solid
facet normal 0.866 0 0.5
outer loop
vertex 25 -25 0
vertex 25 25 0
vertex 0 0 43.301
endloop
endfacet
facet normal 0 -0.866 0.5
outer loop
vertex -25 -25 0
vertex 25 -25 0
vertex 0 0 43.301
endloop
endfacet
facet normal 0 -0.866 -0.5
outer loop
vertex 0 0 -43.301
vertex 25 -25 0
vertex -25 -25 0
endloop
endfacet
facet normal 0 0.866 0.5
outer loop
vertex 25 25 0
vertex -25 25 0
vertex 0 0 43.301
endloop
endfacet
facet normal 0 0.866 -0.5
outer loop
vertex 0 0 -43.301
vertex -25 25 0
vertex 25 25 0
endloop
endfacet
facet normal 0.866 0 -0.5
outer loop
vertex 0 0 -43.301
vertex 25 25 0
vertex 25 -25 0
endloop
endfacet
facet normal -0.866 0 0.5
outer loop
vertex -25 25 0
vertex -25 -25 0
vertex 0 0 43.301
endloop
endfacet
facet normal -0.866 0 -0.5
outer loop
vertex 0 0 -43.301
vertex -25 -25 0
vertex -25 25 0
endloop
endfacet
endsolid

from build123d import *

# Parameters (mm, degrees)
F0_W     = 50
F0_H     = 50
F1_DEPTH = 50
F1_TAPER = 30


with BuildPart() as f1:
    # F0 (on Top) → F1 (new body)
    with BuildSketch(Plane.XY):
        Rectangle(F0_W, F0_H)
    extrude(amount=F1_DEPTH, taper=F1_TAPER)

    # F2: F1 across plane


with BuildPart() as f1_1:
    add(f1.part)
    add(f1.part.mirror(Plane.XY))


solid = f1_1.part
